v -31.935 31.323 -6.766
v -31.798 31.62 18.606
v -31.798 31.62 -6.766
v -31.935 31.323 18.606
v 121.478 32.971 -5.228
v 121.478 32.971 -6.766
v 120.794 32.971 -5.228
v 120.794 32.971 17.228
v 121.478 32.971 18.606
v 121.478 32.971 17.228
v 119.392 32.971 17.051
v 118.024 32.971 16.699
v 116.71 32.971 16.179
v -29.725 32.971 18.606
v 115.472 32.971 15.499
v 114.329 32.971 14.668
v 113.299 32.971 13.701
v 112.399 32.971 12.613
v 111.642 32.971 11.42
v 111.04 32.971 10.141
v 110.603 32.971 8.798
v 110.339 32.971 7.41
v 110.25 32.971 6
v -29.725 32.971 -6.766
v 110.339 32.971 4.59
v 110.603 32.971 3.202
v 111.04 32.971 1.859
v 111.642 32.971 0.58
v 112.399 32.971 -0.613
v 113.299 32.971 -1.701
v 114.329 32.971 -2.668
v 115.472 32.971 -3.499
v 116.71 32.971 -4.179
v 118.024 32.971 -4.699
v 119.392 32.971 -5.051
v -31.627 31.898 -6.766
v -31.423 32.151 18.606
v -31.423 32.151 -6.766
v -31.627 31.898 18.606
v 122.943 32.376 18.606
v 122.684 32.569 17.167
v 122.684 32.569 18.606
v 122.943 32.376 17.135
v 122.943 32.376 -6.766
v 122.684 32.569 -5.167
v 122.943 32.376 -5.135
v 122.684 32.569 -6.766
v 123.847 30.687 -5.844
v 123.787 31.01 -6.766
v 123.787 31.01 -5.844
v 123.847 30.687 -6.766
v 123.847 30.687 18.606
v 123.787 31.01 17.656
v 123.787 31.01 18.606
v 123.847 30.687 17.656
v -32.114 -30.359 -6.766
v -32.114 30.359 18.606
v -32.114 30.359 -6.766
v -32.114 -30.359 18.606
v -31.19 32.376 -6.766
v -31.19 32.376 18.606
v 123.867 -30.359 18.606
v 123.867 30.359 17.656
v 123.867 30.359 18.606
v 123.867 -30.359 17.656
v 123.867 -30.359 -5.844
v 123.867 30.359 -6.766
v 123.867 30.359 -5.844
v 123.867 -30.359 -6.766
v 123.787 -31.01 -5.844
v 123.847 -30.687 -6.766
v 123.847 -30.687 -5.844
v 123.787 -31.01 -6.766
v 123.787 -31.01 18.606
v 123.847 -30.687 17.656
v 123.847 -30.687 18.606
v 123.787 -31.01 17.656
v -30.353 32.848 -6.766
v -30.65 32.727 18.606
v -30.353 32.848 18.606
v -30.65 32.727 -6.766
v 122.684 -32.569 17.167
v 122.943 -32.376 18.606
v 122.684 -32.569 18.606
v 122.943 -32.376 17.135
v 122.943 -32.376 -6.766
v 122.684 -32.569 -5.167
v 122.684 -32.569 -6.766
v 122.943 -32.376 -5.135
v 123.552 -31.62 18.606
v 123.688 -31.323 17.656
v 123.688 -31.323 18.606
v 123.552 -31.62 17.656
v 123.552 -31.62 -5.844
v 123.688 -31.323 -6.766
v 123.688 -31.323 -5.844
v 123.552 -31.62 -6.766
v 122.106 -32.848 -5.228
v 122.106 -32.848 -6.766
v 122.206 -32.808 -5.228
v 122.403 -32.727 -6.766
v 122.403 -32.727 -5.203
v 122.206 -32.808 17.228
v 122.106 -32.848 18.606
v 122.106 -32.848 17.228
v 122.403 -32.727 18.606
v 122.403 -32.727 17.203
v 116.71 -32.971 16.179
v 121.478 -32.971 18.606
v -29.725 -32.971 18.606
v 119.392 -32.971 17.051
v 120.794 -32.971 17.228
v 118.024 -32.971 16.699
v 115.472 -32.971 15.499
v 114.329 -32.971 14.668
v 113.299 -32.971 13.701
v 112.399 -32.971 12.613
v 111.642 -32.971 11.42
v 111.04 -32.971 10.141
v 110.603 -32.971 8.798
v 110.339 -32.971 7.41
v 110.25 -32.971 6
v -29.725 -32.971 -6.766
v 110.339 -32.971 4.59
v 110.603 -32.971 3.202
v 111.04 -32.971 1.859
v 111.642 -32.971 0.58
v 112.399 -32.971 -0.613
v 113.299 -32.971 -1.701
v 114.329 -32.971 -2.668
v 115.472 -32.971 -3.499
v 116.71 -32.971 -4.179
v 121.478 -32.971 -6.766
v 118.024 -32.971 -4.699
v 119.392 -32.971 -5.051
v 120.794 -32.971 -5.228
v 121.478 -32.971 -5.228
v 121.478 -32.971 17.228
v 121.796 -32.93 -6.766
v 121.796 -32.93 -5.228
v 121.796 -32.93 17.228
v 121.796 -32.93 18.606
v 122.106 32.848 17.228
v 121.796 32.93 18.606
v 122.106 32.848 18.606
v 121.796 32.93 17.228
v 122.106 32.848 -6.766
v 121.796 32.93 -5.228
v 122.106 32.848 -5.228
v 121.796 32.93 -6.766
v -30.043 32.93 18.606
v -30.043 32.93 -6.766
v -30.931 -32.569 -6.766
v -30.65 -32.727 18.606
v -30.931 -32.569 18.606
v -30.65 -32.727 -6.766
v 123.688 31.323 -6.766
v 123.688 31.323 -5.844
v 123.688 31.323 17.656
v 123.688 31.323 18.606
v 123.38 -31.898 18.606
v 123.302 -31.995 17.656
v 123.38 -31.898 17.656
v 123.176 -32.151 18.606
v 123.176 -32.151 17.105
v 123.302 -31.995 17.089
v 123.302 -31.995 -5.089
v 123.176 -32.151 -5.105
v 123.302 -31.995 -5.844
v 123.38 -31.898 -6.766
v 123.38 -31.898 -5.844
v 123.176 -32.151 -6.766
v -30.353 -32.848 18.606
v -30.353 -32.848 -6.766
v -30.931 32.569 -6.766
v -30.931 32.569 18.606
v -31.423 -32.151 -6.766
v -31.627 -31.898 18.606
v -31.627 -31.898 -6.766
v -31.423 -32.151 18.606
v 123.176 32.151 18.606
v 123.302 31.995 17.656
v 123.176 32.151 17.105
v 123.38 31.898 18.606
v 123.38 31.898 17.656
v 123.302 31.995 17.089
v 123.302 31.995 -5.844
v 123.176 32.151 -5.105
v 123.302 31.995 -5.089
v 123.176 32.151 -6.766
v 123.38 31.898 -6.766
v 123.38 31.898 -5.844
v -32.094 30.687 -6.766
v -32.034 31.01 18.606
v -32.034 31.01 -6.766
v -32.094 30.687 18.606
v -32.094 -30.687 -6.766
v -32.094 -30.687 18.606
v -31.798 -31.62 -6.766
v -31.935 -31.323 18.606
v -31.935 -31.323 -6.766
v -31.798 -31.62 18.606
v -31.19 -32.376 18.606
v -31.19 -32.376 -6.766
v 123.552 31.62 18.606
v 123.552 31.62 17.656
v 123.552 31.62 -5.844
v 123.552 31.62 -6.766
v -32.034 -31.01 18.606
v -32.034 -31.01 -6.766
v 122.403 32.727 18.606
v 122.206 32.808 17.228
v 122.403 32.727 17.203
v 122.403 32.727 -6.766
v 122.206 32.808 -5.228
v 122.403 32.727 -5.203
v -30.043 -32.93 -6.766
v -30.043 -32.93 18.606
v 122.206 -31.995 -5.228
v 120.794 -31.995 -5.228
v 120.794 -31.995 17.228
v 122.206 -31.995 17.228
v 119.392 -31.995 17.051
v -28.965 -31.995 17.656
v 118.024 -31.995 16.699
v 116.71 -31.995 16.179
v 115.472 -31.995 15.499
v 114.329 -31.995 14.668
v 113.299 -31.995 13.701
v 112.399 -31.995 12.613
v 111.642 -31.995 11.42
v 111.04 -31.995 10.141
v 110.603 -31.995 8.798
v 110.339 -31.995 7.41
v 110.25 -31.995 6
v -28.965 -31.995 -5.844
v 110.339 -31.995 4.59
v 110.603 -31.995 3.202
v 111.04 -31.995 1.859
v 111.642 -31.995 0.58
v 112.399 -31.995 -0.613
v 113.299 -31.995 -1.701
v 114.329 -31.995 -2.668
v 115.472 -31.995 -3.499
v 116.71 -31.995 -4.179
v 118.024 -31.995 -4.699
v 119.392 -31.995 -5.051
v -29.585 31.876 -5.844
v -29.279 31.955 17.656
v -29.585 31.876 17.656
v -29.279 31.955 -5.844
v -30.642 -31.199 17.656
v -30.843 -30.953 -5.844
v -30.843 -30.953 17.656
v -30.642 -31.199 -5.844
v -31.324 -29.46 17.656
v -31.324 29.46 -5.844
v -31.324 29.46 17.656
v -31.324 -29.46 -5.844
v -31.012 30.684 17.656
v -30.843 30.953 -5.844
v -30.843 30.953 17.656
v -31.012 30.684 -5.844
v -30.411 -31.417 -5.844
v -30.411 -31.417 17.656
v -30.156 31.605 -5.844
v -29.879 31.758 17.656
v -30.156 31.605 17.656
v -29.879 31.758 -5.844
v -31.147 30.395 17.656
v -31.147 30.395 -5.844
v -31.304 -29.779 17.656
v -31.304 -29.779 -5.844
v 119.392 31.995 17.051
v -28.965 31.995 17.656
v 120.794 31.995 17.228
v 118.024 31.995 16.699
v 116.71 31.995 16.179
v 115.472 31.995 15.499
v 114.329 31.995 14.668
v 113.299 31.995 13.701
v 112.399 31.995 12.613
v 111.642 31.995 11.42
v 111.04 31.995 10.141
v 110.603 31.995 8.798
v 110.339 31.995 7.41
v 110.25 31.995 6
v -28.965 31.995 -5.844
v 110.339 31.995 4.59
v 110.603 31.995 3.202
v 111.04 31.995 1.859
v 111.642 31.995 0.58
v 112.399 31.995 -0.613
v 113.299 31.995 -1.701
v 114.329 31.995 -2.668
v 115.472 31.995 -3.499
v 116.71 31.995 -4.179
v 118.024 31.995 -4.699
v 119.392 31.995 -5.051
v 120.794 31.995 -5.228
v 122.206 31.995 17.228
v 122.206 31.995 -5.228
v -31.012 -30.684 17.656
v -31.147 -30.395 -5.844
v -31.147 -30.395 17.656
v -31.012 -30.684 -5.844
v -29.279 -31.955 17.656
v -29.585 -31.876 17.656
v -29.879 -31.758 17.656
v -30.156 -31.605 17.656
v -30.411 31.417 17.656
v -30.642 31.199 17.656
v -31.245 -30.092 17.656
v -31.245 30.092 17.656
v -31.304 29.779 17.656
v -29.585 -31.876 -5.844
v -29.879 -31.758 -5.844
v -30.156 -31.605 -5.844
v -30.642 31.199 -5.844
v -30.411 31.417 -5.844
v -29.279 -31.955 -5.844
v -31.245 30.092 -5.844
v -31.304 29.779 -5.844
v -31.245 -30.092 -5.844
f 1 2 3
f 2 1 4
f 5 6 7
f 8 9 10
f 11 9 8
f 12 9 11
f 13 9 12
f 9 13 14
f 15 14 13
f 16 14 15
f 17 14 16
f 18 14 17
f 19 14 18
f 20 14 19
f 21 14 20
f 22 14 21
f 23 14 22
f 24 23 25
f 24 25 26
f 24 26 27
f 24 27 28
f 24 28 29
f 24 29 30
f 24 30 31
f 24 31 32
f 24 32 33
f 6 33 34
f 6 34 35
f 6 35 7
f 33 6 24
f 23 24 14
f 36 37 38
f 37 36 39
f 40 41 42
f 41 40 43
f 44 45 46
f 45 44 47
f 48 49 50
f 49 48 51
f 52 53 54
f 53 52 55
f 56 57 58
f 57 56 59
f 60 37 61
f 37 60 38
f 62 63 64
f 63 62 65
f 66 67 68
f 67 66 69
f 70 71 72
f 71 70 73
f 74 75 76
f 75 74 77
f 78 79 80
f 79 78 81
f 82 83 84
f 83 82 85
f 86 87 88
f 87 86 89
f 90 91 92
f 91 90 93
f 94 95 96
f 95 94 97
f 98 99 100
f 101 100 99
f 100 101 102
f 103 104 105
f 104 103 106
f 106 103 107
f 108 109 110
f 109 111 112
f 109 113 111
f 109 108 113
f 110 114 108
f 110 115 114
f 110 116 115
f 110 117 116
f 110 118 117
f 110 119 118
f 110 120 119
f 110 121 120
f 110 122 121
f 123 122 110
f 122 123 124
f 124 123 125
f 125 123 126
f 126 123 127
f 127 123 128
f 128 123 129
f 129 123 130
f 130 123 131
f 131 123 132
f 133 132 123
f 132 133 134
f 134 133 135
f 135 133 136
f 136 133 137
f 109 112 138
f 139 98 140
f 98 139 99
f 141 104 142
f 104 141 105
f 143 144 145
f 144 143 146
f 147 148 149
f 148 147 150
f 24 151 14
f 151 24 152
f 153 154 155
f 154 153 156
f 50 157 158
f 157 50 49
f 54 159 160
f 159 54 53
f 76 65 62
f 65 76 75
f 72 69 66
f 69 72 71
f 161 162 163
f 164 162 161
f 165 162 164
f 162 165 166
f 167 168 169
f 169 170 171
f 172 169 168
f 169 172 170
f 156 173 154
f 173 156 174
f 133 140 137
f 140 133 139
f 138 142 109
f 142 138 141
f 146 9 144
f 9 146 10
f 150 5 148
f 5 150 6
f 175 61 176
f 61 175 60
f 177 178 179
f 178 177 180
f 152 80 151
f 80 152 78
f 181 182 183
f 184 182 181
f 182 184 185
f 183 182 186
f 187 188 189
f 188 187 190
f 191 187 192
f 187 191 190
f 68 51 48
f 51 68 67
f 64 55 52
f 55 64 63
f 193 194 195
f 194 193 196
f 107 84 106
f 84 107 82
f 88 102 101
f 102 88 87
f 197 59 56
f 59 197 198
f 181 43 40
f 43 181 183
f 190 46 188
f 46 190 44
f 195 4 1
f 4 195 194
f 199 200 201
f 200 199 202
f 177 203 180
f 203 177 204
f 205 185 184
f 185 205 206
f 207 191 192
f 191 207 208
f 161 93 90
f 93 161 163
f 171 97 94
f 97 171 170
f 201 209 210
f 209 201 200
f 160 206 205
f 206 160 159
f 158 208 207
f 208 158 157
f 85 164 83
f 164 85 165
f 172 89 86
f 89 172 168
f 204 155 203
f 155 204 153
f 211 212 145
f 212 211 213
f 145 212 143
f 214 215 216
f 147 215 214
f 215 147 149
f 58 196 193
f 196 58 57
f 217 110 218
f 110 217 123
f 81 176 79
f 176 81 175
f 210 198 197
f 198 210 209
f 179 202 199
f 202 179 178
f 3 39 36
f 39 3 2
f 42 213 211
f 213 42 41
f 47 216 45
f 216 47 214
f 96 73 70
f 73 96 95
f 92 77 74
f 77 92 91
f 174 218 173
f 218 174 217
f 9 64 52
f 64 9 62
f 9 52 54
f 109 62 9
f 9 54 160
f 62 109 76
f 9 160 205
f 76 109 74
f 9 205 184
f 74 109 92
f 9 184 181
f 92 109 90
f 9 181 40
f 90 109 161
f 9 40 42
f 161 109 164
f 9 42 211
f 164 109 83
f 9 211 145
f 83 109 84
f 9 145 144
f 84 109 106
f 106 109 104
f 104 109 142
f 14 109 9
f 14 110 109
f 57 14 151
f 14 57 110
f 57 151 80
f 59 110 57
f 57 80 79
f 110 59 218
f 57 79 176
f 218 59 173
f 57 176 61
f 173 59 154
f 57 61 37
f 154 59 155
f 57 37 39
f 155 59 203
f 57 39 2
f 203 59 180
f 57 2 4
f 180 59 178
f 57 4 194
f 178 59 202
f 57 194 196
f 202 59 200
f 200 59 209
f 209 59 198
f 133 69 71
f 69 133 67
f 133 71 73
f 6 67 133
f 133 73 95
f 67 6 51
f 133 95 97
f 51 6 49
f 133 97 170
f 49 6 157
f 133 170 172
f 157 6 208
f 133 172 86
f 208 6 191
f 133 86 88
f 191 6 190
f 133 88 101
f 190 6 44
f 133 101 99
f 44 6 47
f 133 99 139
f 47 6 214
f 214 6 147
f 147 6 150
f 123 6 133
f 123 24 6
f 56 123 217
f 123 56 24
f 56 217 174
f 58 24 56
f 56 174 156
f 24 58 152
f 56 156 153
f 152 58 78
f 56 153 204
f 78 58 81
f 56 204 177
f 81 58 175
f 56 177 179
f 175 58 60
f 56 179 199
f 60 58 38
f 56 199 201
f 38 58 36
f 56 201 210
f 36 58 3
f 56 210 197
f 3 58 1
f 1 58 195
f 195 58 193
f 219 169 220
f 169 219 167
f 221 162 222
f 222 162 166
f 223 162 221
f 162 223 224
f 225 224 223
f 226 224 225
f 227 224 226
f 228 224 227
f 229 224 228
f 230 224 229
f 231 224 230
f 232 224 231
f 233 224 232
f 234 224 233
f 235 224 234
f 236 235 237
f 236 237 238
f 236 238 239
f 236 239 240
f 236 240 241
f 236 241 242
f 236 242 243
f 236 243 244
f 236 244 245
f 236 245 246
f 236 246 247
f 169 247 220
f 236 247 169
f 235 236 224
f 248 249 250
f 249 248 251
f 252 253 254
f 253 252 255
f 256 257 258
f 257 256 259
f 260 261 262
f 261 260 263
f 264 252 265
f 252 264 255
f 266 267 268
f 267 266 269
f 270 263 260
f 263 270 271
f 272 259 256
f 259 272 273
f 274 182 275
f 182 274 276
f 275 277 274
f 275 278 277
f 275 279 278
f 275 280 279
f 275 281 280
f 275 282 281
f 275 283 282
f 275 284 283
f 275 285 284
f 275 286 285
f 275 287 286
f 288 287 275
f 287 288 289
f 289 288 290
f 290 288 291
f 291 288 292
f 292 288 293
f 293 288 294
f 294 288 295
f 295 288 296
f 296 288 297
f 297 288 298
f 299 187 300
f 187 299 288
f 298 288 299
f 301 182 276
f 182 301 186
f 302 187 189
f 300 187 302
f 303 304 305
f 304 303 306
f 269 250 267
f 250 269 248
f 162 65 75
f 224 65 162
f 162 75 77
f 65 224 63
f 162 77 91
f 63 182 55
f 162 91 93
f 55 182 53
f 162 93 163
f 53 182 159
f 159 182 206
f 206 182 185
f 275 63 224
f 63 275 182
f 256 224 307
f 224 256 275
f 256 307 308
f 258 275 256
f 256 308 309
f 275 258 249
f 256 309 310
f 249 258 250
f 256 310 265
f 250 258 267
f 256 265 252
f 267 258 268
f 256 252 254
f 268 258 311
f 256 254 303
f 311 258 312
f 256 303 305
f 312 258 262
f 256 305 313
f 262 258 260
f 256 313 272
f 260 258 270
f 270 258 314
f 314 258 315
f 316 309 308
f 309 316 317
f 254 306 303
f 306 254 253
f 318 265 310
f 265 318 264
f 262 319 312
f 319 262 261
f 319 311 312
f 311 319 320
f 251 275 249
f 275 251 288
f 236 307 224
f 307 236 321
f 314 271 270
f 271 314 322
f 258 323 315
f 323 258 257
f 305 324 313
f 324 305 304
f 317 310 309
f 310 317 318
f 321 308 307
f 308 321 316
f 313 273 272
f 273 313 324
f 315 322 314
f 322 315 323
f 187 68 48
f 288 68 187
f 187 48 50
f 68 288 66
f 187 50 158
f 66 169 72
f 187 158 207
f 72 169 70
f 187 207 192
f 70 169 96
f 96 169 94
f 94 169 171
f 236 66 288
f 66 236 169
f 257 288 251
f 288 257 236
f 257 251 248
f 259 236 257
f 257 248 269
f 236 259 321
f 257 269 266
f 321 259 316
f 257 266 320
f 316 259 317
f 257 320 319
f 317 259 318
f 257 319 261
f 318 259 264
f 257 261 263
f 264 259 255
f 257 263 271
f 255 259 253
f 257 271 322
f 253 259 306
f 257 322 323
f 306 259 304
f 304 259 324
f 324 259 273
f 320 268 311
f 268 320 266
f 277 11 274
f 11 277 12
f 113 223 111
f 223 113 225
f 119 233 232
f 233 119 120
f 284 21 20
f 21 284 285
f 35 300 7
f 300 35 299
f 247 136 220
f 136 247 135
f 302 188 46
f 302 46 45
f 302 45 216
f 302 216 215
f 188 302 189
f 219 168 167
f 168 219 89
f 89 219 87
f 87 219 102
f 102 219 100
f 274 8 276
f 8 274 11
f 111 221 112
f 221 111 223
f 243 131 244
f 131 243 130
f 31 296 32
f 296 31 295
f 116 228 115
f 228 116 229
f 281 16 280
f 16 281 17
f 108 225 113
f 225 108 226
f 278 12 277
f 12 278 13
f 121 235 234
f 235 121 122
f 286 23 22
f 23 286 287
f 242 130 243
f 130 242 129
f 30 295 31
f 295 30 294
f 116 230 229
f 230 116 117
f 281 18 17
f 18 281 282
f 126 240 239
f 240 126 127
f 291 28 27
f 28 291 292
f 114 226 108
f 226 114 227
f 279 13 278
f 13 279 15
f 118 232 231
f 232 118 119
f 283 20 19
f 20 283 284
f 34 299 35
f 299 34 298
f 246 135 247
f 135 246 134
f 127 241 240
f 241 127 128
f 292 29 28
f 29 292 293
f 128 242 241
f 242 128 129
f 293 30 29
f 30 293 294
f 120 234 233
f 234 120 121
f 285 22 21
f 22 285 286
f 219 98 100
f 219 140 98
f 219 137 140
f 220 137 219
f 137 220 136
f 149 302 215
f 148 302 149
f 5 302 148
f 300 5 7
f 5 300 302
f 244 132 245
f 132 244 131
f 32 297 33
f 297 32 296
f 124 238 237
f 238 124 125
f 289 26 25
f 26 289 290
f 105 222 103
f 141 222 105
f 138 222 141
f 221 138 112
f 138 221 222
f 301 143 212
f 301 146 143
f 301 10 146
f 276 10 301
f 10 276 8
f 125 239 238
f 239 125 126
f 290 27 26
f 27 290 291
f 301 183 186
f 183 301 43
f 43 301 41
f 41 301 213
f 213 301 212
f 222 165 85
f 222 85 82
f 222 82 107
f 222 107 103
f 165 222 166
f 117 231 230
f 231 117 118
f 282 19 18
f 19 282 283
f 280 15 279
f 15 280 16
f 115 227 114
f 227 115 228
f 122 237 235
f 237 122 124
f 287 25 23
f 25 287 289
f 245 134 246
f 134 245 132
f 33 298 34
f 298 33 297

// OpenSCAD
HEAD_DIA = 60;
HEAD_THICKNESS = 12;

ARM_DIA = 21;
ARM_LENGTH = 150;

TOOL_CAVITY_WIDTH = ARM_LENGTH - HEAD_DIA - 5;
TOOL_CAVITY_LENGTH = HEAD_DIA - ARM_DIA - 5;

CORNER_DIA = 5;
WALL_THICKNESS = 1.5;

$fn = 50;

OFFSET = 10;

module micrometer() {
  #union() {
    hull() {
      cylinder(d = HEAD_DIA, h = HEAD_THICKNESS);
      translate([-HEAD_DIA/2, (HEAD_DIA - ARM_DIA)/2, HEAD_THICKNESS/2])
      rotate([0, 90, 0])
      cylinder(d = HEAD_THICKNESS, h = HEAD_DIA);

      translate([0, 0, OFFSET]) {
        cylinder(d = HEAD_DIA, h = HEAD_THICKNESS);
        translate([-HEAD_DIA/2, (HEAD_DIA - ARM_DIA)/2, HEAD_THICKNESS/2])
        rotate([0, 90, 0])
        cylinder(d = HEAD_THICKNESS, h = HEAD_DIA);
      }
    }
    
    hull() {
      translate([-HEAD_DIA/2, (HEAD_DIA - ARM_DIA)/2, HEAD_THICKNESS/2])
      rotate([0, 90, 0])
      cylinder(d = ARM_DIA, h = ARM_LENGTH);

      translate([-HEAD_DIA/2, (HEAD_DIA - ARM_DIA)/2, HEAD_THICKNESS/2 + OFFSET])
      rotate([0, 90, 0])
      cylinder(d = ARM_DIA, h = ARM_LENGTH);
    }
  }
}

module rounded_rect(width, length, height, corner_dia) {
  hull() {
    for(i = [-1, 1]) {
      for(j = [-1, 1]) {
        translate([i * (width - corner_dia)/2, j * (length - corner_dia)/2, 0])
        cylinder(d = corner_dia, h = height);
      }
    }
  }
}

module tool_cavity() {
  #rounded_rect(TOOL_CAVITY_WIDTH, TOOL_CAVITY_LENGTH, HEAD_THICKNESS + OFFSET, CORNER_DIA); 
}

module insert() {
  difference() {
    translate([(ARM_LENGTH - HEAD_DIA)/2, 0, -(ARM_DIA - HEAD_THICKNESS)/2 - WALL_THICKNESS])
    rounded_rect(ARM_LENGTH + 2 * WALL_THICKNESS, HEAD_DIA + 2 * WALL_THICKNESS, ARM_DIA + WALL_THICKNESS, CORNER_DIA);

    union() {
      micrometer();
      translate([ARM_LENGTH - TOOL_CAVITY_WIDTH/2 - HEAD_DIA/2, -(HEAD_DIA-TOOL_CAVITY_LENGTH)/2, 0])
      tool_cavity();
    }
  }
}

module case() {
  difference() {
    delta = 1.0;
    wt = 2 * WALL_THICKNESS;

    scale_x = (ARM_LENGTH + 2 * wt + delta) / (ARM_LENGTH + wt + delta);
    scale_y = (HEAD_DIA + 2 * wt + delta) / (HEAD_DIA + wt + delta);
    scale_z = (ARM_DIA + 1.5 * wt + delta) / (ARM_DIA + 0.5 * wt + delta);

    scale([scale_x, scale_y, scale_z])
    hull()
    insert();    

    delta_x = (ARM_LENGTH + wt + delta) / (ARM_LENGTH + wt);    delta_y = (HEAD_DIA + wt + delta) / (HEAD_DIA + wt);
    delta_z = (ARM_DIA + 0.5 * wt + delta) / (ARM_DIA + 0.5 * wt);
  
    #translate([scale_x/2 * WALL_THICKNESS/2, 0, scale_z/2 * WALL_THICKNESS/2])
    scale([delta_x, delta_y, delta_z])
    hull() {
      insert();
      translate([10, 0, 0])
      insert();
    }
    
    #translate([ARM_LENGTH - HEAD_DIA/2 + WALL_THICKNESS, 0, (ARM_DIA-HEAD_THICKNESS)/2 + WALL_THICKNESS])
    rotate([90, 0, 0])
    cylinder(d = ARM_DIA + WALL_THICKNESS, h = 2 * HEAD_DIA, center = true);
  }
}

//insert();
case();
